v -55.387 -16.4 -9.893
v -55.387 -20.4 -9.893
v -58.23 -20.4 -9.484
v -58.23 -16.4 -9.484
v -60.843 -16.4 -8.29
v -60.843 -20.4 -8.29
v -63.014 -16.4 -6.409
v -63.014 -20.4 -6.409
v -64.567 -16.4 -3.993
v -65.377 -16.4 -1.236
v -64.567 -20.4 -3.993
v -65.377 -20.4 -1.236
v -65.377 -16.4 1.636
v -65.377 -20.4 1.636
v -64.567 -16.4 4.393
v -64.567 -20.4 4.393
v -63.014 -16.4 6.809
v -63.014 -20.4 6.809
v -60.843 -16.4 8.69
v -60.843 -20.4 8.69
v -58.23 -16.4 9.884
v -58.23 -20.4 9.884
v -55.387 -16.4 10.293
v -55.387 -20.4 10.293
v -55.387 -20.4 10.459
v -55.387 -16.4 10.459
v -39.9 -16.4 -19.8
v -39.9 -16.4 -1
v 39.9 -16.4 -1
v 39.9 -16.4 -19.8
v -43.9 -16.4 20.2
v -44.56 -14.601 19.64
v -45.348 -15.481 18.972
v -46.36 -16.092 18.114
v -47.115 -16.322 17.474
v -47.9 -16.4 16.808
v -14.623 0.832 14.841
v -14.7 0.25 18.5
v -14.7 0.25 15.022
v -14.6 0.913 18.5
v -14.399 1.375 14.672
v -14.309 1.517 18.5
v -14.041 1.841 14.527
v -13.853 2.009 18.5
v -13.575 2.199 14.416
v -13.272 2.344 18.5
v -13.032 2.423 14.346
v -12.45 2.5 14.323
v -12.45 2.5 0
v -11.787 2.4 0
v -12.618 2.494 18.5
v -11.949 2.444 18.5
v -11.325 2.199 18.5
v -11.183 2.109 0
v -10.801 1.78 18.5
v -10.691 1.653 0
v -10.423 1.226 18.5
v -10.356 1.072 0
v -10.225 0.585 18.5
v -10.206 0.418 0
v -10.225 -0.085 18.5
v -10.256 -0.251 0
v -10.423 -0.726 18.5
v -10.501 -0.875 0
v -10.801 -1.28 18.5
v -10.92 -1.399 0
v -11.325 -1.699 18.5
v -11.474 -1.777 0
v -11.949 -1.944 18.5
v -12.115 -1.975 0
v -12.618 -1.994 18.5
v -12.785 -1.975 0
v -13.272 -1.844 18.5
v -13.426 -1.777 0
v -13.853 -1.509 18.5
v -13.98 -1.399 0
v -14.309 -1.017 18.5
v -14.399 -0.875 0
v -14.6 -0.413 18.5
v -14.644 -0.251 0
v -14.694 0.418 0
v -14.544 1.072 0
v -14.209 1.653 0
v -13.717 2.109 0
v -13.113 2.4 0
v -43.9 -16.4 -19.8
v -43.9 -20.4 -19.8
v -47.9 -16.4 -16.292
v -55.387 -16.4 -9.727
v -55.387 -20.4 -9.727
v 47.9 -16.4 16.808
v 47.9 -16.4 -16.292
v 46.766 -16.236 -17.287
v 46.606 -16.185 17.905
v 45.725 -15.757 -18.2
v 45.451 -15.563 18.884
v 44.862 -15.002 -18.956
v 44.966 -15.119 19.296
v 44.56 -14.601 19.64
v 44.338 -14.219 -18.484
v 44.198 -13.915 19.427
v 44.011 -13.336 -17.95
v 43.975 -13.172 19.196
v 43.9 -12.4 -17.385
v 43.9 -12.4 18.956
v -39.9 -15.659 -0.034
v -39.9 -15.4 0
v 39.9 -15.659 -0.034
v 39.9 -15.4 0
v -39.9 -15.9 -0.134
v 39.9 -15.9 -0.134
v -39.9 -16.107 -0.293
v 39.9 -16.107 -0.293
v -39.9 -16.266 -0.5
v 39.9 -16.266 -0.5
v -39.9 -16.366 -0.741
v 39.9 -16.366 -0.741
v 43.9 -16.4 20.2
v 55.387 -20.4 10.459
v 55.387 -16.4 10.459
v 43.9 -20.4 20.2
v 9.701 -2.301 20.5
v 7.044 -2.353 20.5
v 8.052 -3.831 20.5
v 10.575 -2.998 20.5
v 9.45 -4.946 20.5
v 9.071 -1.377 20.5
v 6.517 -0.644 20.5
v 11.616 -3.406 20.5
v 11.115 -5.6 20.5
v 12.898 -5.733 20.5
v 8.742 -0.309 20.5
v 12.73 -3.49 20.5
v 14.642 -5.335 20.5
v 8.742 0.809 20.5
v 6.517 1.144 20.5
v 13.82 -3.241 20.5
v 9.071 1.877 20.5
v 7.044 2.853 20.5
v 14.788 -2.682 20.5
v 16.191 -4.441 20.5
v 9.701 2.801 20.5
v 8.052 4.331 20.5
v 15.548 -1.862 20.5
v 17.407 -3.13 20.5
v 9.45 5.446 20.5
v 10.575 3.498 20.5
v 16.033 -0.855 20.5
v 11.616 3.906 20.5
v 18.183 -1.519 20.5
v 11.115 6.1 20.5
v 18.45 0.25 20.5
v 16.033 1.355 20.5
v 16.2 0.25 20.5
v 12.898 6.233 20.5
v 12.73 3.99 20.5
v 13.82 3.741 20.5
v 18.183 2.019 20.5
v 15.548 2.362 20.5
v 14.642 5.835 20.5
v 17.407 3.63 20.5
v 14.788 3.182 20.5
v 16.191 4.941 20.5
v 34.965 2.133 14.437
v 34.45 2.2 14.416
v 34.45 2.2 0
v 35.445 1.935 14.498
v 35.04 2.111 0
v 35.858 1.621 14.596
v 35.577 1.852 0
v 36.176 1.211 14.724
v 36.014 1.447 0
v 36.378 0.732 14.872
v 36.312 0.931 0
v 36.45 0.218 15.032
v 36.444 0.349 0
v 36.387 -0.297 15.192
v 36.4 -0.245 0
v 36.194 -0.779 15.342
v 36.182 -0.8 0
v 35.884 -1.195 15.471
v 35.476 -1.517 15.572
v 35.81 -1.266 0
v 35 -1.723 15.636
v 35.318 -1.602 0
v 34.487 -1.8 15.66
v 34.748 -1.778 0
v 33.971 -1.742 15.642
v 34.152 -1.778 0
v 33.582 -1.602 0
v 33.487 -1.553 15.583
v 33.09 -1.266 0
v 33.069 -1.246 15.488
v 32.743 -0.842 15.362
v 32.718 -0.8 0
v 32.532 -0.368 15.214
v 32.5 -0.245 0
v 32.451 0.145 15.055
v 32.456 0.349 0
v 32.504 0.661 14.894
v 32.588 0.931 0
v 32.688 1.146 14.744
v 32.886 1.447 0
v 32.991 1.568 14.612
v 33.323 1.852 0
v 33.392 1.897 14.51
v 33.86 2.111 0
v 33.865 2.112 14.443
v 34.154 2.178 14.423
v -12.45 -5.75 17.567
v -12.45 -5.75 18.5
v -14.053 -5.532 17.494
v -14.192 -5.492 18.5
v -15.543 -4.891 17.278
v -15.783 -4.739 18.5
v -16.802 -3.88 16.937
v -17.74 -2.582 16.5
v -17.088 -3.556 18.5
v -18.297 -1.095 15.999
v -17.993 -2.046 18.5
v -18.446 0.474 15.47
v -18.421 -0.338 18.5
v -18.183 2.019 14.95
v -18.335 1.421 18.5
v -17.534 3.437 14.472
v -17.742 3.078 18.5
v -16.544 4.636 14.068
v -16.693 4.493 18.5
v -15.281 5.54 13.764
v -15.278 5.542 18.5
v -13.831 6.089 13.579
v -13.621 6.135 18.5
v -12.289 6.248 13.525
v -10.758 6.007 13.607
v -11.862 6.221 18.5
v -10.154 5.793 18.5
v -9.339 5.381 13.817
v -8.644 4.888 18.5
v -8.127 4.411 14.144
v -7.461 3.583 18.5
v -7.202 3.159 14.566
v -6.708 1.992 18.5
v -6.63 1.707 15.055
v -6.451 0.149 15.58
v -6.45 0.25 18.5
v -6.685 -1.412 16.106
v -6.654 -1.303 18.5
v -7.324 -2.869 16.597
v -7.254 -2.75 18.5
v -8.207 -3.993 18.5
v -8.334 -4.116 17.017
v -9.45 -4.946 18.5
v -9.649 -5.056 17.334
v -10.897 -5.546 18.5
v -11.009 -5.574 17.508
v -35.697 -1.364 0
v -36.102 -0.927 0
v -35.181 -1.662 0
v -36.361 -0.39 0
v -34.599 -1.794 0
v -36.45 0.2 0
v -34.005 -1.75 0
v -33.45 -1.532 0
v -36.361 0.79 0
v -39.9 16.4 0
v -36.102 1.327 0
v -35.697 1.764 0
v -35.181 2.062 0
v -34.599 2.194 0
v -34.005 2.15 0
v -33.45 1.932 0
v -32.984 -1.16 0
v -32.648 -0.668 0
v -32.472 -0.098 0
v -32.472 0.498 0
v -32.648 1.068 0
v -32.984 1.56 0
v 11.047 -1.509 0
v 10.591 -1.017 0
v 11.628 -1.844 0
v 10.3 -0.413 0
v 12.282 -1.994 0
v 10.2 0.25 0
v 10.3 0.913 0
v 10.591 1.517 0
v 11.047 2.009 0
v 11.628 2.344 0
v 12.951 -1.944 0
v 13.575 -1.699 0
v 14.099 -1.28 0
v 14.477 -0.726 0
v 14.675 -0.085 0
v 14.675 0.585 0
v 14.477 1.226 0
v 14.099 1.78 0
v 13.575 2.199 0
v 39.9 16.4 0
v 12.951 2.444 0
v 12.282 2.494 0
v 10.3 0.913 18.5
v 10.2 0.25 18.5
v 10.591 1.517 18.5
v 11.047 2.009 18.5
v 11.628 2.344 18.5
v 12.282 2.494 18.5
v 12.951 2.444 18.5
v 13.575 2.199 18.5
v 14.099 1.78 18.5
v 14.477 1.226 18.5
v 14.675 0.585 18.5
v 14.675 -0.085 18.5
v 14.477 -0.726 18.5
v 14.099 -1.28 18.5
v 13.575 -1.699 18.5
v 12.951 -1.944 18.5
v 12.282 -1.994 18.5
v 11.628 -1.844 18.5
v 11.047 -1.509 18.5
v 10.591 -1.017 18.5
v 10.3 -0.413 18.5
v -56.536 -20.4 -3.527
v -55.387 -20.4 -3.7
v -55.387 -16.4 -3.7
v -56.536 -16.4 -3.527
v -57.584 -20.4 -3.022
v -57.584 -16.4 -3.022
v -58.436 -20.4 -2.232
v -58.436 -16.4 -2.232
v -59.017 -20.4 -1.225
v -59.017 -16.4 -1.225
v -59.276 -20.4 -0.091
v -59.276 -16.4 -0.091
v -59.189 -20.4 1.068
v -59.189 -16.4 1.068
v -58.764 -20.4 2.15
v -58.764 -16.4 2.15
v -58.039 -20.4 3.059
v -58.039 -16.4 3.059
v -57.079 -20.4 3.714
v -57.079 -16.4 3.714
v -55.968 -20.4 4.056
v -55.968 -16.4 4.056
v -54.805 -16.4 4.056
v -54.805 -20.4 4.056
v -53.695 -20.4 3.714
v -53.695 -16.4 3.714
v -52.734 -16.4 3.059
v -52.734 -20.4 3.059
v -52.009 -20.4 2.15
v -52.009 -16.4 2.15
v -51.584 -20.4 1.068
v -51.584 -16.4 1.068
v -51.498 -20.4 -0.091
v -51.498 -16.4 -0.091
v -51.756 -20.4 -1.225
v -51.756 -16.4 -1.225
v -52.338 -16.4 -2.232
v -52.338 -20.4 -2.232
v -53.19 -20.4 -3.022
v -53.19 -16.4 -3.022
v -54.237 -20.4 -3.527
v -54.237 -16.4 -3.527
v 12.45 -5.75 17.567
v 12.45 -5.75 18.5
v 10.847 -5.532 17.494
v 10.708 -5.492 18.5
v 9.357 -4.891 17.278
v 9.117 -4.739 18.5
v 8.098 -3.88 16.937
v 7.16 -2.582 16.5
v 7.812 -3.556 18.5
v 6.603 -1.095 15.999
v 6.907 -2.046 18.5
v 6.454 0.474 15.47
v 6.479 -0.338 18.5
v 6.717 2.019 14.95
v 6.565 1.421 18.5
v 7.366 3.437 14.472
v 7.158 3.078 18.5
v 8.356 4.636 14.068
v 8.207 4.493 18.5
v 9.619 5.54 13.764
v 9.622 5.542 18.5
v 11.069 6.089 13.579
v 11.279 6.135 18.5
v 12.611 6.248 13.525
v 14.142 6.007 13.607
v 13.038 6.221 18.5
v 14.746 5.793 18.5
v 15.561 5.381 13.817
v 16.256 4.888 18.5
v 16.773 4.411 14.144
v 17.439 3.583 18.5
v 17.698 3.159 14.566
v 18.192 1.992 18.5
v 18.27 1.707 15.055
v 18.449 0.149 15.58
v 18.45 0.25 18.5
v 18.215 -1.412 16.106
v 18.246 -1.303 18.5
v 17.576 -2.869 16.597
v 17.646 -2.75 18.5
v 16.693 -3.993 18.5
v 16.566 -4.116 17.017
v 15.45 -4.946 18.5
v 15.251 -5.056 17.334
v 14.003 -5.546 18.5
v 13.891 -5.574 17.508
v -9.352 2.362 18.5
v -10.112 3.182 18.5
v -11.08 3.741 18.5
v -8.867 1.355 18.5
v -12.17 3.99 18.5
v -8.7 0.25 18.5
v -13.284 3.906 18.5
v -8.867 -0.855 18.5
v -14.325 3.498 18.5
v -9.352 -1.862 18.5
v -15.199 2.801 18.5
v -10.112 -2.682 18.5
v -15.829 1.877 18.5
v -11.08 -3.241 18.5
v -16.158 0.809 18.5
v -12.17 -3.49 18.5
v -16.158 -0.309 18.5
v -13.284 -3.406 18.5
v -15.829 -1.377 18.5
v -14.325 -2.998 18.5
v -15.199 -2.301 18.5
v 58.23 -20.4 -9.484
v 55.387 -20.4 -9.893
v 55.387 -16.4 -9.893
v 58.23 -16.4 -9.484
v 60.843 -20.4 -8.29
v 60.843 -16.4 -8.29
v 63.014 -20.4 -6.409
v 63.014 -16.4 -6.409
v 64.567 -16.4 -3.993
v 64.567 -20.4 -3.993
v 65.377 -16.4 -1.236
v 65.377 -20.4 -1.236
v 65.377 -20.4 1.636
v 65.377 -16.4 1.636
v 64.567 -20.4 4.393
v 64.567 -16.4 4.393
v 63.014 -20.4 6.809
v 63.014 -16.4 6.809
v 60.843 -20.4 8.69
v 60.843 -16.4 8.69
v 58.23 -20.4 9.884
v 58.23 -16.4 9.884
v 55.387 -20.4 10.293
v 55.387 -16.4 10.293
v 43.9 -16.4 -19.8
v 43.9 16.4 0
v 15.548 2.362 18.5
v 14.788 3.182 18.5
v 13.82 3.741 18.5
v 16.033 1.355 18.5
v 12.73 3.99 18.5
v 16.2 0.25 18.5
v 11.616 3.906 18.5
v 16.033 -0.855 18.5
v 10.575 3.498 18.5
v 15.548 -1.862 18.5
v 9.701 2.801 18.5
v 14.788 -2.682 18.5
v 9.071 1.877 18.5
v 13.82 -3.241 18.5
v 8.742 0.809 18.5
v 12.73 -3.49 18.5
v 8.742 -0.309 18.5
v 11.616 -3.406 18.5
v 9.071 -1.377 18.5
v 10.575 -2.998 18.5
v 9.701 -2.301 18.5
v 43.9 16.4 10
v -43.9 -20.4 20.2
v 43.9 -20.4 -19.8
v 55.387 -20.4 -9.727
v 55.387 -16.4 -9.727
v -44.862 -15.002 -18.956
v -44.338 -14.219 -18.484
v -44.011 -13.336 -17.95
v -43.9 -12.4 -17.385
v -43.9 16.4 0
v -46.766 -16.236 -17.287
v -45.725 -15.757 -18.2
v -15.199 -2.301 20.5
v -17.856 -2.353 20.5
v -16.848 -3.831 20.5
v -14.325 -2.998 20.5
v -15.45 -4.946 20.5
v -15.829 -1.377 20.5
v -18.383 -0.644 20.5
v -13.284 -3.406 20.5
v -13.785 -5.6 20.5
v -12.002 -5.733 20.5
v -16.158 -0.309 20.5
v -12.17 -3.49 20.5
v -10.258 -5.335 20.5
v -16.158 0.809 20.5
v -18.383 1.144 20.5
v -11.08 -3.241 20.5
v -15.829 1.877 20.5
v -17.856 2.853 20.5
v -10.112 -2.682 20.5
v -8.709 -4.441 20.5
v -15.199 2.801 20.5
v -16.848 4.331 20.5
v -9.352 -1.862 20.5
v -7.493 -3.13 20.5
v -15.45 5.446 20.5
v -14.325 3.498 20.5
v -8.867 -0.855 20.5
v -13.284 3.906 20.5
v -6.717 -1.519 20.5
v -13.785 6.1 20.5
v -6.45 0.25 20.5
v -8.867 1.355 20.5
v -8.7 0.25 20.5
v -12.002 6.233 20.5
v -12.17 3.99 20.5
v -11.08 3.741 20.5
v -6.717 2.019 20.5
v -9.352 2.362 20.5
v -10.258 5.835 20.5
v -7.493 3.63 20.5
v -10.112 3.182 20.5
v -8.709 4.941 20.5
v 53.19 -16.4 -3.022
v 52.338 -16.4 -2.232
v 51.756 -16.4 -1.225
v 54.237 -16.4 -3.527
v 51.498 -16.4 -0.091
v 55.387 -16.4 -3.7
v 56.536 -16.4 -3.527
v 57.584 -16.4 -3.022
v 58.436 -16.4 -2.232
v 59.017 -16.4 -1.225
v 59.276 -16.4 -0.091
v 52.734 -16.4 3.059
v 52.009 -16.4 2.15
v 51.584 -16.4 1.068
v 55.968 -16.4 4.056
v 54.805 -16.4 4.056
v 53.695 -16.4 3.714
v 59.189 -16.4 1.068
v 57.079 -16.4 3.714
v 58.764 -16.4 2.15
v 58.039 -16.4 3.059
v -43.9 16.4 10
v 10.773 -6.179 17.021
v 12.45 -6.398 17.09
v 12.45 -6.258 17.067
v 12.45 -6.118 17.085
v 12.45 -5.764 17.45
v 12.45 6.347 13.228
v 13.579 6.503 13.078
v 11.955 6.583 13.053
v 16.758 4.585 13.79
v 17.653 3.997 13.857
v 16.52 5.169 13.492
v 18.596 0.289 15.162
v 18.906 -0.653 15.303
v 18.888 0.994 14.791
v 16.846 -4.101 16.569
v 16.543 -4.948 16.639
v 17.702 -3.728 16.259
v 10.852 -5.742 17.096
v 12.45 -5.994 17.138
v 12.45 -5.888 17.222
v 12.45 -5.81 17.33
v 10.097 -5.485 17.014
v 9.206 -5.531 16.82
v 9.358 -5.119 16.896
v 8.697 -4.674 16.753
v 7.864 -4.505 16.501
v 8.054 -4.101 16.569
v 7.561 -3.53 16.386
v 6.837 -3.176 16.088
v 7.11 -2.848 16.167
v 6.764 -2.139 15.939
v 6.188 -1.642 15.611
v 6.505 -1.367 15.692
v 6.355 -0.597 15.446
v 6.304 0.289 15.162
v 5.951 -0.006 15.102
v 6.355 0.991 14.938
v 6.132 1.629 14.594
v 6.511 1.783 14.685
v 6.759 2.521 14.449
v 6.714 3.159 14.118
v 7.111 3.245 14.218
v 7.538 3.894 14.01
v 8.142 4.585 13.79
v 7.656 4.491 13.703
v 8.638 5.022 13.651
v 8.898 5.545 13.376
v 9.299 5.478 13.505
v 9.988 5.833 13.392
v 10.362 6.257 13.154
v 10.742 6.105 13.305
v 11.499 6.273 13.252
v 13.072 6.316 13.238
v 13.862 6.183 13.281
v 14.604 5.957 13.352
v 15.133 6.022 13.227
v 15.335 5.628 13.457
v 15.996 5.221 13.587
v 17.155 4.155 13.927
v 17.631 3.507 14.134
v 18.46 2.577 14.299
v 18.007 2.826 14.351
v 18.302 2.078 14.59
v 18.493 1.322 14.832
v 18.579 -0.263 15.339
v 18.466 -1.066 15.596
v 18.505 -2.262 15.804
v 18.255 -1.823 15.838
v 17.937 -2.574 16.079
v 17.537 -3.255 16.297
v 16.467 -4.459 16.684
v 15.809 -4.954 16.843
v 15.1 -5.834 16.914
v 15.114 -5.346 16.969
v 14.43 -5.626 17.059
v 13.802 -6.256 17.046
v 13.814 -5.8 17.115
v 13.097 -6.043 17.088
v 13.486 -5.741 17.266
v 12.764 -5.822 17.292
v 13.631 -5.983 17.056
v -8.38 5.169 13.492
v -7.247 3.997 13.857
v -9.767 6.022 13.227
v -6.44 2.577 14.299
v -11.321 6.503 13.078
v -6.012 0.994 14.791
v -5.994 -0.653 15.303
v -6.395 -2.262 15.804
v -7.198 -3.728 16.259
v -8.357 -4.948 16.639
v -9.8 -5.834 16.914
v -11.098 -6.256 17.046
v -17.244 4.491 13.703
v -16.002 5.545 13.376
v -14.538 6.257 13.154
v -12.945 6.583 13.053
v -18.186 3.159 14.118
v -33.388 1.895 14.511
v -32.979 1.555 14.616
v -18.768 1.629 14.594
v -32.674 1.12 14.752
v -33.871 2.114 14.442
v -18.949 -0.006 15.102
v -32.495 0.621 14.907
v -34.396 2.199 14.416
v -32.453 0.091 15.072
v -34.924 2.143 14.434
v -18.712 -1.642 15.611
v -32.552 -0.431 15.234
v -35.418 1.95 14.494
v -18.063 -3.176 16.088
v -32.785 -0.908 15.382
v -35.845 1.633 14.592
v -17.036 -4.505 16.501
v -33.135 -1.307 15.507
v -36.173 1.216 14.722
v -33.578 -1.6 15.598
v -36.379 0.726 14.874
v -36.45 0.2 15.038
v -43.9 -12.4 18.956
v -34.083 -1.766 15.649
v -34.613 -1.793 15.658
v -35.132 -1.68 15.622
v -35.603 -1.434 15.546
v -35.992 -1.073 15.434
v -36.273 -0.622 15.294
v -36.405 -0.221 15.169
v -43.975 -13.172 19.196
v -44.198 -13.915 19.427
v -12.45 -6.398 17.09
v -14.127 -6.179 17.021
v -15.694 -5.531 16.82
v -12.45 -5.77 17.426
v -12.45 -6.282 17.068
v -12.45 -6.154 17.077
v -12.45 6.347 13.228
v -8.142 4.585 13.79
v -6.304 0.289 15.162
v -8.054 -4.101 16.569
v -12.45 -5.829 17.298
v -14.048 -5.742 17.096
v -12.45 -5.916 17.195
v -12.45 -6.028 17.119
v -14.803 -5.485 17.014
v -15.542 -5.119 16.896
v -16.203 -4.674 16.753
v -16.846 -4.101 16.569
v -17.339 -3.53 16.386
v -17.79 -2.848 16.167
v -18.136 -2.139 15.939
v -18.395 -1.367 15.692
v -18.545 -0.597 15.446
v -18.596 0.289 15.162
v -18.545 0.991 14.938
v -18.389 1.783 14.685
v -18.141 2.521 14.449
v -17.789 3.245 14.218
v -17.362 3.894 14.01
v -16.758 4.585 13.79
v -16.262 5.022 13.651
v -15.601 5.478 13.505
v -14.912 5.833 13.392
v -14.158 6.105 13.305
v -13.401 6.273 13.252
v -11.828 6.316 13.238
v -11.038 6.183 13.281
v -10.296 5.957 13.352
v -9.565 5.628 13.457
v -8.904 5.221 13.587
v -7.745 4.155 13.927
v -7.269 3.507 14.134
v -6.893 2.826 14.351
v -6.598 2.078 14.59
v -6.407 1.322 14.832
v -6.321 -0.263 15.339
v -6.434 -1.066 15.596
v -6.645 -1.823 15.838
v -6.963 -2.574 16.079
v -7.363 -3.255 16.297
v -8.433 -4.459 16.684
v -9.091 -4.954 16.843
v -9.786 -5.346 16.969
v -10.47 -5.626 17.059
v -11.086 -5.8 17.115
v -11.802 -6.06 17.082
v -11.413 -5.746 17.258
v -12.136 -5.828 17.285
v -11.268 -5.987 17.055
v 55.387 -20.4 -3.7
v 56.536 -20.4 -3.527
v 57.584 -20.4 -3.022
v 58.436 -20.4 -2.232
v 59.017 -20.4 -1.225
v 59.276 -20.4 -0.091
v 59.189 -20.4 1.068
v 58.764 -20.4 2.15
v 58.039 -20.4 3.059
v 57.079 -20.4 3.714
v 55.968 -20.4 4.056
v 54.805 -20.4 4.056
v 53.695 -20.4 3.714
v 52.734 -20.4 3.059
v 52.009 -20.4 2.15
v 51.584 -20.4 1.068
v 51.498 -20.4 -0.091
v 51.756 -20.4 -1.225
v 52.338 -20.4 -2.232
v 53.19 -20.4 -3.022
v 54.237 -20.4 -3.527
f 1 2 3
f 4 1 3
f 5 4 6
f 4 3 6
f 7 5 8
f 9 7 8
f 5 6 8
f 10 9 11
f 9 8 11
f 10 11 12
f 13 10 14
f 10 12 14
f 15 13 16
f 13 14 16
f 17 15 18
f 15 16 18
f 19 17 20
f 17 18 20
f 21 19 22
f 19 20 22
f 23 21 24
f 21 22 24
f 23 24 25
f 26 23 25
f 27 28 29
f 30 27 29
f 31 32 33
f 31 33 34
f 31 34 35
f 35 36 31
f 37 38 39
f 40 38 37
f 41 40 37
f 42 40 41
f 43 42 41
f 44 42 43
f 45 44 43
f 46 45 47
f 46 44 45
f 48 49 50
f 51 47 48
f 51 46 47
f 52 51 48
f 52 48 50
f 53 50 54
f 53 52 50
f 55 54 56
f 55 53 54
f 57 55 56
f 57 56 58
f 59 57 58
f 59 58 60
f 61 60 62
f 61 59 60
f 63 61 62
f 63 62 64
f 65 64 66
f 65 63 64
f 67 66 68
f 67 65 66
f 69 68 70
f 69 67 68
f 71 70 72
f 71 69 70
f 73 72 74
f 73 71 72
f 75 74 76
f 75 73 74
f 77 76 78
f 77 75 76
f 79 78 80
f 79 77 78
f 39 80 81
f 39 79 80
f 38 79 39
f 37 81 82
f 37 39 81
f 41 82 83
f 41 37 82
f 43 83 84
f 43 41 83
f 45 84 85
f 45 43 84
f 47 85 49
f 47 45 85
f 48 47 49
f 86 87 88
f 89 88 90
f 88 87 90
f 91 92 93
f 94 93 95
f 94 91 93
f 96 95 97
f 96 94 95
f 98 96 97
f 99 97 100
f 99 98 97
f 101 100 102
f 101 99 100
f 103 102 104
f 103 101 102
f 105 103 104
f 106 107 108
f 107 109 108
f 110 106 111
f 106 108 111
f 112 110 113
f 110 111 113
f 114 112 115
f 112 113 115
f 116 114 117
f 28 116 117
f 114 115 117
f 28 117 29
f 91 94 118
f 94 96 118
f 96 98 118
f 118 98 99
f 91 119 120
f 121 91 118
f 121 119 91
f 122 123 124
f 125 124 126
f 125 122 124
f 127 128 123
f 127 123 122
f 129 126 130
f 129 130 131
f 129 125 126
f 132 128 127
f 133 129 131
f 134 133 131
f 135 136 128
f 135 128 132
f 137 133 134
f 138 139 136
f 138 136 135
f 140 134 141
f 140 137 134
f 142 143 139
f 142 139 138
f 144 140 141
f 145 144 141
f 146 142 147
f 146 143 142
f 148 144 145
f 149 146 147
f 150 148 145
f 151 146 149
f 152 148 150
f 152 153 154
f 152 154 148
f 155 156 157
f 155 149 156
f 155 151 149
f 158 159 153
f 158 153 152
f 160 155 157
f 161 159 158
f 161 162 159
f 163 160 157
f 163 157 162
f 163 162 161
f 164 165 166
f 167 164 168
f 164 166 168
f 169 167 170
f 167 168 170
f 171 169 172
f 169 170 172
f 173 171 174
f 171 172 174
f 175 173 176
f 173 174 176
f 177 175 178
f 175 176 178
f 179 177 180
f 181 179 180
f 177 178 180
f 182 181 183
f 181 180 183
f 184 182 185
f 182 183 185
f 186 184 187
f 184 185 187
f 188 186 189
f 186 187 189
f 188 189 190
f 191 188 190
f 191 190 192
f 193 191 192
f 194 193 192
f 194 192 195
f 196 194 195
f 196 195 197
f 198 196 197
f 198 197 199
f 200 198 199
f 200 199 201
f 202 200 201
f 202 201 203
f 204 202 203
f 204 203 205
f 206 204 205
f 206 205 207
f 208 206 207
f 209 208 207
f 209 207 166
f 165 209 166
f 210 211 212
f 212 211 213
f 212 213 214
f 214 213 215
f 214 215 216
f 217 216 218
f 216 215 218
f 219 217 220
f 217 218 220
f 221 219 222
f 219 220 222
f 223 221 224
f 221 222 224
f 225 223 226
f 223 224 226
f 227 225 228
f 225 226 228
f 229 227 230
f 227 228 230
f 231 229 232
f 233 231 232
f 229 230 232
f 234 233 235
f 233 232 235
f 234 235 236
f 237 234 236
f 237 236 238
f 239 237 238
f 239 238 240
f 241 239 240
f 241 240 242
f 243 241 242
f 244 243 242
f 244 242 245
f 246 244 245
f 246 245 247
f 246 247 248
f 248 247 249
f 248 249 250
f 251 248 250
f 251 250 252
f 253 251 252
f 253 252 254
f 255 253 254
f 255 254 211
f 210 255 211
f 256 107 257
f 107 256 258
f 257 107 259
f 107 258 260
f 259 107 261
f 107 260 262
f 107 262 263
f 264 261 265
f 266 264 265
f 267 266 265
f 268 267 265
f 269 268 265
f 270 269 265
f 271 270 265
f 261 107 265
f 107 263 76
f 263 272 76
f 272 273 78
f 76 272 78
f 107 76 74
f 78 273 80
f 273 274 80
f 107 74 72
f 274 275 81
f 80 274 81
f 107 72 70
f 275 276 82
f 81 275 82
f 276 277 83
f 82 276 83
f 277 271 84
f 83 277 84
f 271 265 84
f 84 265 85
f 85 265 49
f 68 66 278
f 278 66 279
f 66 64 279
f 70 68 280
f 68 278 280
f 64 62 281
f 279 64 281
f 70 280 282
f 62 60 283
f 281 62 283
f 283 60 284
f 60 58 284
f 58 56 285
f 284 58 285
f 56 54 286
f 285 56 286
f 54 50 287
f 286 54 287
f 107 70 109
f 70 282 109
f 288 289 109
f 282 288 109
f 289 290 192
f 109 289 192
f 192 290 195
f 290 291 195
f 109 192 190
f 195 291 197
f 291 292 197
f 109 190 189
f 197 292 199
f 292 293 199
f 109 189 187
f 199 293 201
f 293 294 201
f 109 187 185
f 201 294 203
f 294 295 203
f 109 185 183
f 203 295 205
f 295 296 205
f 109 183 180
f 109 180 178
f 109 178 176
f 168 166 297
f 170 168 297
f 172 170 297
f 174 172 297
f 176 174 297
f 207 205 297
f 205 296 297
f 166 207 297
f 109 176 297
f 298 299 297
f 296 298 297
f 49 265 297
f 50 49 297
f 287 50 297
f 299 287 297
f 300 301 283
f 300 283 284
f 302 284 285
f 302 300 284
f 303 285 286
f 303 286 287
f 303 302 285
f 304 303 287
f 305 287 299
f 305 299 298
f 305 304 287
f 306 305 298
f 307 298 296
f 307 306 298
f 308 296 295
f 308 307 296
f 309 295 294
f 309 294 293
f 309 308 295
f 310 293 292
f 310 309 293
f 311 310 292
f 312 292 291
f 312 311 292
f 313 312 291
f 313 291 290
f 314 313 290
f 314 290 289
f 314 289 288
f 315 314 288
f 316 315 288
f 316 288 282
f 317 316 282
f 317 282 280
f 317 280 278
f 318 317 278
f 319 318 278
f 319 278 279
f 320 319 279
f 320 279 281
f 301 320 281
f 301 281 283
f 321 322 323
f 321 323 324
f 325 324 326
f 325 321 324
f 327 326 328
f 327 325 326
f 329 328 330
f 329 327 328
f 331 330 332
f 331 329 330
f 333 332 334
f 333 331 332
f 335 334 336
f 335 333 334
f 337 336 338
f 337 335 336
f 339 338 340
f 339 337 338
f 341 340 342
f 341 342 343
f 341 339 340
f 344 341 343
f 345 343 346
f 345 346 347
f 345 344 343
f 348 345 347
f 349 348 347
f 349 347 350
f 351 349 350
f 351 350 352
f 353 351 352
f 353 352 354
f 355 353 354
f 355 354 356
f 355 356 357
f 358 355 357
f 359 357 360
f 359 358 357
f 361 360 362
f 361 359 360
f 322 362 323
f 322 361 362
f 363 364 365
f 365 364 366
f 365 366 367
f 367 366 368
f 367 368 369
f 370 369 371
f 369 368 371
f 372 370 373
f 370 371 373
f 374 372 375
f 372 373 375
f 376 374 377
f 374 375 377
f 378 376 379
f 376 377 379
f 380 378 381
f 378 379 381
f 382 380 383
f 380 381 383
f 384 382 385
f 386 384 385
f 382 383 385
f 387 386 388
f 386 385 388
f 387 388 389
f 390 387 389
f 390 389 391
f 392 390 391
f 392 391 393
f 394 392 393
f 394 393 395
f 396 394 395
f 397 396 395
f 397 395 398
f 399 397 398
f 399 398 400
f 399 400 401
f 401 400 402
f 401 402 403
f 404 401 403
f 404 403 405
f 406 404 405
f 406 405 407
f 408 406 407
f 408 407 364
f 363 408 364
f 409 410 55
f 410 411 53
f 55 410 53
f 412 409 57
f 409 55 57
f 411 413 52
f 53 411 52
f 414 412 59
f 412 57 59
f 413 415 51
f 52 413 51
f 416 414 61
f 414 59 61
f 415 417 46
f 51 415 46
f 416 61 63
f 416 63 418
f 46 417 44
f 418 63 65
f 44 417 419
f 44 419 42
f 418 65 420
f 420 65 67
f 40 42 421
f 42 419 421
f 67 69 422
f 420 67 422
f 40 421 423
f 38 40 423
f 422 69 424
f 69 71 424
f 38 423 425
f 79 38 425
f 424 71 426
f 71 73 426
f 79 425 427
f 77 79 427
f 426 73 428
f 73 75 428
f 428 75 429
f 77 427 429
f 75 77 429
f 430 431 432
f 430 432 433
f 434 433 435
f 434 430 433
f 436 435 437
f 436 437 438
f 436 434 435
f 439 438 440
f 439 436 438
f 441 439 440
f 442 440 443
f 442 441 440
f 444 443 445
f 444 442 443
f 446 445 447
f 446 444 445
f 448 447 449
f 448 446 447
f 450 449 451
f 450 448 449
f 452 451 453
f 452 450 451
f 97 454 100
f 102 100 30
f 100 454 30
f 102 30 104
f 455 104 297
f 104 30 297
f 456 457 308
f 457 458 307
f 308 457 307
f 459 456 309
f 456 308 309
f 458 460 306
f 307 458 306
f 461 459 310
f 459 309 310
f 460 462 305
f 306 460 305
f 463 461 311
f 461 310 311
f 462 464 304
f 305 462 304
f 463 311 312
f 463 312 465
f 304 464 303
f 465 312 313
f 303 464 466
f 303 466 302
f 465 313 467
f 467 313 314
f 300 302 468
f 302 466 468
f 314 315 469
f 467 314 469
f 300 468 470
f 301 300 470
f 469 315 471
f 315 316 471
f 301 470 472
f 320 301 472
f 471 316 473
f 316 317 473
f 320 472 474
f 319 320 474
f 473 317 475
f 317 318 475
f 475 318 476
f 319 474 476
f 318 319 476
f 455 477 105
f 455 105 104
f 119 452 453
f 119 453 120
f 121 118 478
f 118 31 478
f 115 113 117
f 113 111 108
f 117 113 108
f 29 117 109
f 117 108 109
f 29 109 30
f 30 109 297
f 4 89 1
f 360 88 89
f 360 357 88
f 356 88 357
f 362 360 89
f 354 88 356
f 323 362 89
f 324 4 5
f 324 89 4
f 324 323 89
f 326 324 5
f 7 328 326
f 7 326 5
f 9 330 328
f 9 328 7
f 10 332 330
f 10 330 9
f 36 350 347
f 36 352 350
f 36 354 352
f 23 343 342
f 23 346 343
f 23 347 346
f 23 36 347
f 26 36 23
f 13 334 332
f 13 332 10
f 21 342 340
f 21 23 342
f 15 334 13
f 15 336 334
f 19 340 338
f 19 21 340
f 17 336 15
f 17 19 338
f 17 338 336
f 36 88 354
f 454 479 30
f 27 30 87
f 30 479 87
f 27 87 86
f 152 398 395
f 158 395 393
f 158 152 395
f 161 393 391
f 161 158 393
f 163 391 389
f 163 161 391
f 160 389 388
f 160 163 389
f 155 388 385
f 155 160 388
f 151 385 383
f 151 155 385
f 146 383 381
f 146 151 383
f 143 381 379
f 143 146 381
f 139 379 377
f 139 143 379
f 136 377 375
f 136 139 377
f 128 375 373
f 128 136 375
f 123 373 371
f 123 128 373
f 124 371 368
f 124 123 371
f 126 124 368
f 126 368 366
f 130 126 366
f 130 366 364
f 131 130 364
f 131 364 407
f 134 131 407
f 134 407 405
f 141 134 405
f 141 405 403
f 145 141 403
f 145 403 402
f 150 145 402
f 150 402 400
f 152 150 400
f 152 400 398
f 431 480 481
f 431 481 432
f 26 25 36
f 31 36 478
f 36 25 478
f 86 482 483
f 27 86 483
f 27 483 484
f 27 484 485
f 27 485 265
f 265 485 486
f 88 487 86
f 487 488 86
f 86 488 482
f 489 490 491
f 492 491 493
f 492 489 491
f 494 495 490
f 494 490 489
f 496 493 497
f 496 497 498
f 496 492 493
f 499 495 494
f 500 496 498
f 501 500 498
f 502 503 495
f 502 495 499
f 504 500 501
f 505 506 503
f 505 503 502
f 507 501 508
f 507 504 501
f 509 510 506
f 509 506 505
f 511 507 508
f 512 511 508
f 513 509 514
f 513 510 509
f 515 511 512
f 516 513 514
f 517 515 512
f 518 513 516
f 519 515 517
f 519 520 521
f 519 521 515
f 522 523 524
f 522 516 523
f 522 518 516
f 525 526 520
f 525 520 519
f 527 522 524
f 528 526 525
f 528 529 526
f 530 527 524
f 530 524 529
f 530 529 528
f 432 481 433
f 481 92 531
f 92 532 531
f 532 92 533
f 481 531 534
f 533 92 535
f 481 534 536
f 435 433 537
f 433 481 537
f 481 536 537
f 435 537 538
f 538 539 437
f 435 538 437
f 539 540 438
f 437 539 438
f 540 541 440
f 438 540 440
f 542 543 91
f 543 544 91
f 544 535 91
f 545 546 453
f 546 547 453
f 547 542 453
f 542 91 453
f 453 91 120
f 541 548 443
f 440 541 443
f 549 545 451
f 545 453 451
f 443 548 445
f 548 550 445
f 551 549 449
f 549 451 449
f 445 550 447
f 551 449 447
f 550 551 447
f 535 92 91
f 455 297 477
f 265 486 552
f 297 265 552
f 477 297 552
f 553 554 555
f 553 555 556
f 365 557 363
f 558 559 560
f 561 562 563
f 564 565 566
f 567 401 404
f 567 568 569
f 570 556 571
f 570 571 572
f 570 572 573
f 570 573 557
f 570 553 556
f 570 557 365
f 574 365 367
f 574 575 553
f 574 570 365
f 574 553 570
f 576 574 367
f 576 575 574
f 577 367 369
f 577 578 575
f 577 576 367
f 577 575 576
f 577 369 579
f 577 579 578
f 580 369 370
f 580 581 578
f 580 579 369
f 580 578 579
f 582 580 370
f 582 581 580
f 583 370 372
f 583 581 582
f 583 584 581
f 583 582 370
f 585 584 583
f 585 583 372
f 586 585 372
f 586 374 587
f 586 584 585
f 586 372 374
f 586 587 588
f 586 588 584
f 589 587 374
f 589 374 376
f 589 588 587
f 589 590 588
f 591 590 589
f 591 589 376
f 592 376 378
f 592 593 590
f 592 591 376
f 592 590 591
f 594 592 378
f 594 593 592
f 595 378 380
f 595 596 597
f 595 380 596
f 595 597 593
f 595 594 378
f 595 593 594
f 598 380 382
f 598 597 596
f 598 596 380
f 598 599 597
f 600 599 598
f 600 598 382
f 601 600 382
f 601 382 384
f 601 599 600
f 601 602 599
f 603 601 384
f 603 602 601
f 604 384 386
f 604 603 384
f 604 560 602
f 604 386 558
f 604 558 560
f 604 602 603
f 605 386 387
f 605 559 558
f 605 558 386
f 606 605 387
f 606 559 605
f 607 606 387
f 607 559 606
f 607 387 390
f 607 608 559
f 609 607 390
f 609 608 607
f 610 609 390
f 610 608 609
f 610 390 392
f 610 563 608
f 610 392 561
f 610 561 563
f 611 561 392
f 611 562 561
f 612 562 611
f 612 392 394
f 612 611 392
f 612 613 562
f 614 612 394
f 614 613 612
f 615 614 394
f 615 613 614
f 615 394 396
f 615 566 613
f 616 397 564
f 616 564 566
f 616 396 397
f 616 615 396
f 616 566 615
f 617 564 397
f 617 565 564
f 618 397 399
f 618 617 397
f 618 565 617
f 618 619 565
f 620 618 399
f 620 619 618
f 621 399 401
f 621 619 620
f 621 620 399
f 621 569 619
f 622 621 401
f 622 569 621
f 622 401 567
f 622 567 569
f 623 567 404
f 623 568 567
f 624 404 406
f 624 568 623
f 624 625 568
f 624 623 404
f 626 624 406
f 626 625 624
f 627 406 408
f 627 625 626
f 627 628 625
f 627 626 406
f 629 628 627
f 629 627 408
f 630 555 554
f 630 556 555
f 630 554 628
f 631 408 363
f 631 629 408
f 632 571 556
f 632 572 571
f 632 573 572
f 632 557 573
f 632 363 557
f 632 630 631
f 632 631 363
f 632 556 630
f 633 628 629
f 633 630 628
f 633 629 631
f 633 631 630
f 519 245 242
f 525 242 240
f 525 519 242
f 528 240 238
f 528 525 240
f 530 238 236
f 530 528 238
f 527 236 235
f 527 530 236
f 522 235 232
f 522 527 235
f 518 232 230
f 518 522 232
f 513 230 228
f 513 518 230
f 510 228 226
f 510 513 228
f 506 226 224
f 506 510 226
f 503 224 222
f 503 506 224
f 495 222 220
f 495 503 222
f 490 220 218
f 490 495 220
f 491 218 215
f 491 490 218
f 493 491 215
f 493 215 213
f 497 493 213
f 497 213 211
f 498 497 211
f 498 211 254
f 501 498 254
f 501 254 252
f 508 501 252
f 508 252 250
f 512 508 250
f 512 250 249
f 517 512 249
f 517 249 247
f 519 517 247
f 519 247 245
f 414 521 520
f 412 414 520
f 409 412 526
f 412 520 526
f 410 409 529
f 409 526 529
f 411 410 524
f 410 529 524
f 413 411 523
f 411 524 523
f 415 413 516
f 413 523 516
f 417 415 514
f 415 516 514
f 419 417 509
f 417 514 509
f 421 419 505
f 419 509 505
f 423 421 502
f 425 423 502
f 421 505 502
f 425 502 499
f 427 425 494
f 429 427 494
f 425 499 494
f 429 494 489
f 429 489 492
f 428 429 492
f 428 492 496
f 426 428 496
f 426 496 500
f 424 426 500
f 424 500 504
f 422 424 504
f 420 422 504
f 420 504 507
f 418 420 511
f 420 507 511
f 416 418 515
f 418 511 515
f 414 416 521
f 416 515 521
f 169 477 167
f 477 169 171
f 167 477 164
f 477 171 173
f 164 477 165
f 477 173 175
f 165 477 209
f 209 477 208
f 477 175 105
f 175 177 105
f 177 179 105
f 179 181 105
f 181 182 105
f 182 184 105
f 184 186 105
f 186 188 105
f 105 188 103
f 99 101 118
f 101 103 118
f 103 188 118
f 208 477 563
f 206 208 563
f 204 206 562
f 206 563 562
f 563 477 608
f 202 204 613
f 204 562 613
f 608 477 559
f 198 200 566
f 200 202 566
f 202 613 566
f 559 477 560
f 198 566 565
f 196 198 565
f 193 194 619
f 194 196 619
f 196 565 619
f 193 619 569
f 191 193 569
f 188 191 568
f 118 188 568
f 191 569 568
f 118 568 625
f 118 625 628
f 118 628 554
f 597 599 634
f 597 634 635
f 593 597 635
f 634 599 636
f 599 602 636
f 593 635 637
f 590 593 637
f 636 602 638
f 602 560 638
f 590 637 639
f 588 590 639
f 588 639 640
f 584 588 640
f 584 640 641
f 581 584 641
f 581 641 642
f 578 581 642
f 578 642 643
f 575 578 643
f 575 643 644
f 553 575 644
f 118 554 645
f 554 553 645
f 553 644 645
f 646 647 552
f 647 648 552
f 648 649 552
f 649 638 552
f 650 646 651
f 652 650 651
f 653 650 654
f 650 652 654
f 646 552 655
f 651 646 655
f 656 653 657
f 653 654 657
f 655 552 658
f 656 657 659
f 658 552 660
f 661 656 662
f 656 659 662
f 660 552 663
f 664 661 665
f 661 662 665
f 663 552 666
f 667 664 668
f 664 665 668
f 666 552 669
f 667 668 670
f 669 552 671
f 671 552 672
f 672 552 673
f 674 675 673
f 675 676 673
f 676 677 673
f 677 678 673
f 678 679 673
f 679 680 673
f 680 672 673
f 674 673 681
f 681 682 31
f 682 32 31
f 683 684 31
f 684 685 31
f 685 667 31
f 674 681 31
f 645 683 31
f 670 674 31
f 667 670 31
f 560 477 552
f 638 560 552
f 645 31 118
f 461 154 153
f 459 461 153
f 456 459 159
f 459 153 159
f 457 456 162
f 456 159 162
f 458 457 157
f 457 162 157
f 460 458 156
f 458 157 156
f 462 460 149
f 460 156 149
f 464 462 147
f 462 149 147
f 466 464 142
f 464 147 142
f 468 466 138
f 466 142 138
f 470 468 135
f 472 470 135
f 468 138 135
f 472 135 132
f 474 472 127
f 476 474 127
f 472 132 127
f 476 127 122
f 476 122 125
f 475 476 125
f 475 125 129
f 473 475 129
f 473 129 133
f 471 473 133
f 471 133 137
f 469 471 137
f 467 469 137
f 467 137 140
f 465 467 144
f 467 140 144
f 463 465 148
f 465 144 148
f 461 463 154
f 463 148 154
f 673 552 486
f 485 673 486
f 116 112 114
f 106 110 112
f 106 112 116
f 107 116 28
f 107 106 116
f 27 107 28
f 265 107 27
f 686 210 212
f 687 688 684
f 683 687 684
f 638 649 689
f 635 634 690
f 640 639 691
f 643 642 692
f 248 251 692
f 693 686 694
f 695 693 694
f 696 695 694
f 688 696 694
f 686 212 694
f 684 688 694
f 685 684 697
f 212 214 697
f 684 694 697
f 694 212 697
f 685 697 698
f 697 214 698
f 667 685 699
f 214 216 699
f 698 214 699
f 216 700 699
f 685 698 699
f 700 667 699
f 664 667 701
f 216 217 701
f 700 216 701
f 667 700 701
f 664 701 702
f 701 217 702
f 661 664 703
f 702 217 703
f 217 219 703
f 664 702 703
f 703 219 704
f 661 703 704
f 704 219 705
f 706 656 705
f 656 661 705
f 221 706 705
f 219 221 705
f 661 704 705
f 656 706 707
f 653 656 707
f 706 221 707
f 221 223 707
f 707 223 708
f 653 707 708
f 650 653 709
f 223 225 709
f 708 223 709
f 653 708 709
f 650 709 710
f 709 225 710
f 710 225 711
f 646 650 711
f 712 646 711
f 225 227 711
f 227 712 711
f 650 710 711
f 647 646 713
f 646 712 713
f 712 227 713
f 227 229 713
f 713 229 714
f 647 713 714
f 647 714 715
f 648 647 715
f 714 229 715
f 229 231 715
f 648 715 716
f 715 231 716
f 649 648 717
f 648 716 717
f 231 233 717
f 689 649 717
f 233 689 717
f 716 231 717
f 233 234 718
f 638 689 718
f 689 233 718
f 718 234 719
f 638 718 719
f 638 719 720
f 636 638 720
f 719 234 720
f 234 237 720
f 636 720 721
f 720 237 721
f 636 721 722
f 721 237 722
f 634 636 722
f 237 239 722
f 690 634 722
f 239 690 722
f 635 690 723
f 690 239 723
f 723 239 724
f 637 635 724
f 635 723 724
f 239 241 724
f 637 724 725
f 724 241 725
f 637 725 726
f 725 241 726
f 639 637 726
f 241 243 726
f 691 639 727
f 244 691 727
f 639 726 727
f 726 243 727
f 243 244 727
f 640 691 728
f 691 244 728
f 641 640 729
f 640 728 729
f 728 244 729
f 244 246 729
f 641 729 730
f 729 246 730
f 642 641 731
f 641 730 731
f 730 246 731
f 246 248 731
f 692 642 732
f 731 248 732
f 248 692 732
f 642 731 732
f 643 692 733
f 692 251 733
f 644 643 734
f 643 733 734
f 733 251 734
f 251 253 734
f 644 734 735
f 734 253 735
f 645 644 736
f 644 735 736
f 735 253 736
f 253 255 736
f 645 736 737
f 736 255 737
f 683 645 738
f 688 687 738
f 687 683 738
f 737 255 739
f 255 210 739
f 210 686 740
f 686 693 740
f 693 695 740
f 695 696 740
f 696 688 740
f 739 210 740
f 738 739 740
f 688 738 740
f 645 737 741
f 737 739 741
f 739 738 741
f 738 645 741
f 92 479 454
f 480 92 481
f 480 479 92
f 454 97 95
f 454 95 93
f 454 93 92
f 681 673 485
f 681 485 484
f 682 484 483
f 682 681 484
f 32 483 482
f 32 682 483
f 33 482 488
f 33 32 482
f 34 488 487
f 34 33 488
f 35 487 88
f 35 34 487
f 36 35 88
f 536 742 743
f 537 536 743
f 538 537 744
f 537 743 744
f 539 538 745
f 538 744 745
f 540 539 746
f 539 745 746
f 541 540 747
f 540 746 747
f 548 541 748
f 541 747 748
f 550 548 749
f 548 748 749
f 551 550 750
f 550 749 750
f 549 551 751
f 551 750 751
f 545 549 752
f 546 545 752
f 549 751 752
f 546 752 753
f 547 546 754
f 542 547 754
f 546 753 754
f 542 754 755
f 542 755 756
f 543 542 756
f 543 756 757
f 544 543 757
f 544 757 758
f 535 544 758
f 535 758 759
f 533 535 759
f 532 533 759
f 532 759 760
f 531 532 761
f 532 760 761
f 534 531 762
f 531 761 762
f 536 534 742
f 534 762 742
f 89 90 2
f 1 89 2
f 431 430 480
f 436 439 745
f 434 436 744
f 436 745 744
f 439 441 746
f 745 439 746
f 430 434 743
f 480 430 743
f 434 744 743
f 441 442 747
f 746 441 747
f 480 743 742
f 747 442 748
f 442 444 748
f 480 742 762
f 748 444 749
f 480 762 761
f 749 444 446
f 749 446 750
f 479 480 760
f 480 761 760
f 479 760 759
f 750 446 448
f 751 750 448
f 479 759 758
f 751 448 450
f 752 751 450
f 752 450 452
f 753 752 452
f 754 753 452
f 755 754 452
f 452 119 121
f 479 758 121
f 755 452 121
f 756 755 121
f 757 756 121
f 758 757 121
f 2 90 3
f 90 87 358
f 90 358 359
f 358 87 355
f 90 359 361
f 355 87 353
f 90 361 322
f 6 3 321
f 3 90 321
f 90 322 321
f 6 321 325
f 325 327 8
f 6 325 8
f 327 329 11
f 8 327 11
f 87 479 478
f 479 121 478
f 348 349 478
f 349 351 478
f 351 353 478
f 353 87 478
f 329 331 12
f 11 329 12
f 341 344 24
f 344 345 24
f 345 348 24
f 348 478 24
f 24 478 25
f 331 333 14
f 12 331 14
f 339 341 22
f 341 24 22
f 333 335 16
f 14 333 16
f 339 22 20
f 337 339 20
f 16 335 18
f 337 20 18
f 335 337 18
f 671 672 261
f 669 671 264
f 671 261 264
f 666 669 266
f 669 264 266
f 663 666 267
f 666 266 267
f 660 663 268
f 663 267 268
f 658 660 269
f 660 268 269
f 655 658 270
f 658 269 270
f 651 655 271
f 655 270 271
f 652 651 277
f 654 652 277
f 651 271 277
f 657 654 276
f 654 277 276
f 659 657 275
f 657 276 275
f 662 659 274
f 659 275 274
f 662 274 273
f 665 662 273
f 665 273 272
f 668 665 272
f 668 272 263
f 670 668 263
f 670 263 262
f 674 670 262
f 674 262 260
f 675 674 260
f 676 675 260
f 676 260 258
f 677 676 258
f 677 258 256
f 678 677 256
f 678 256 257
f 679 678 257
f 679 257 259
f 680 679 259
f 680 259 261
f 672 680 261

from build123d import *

# Parameters (mm, degrees)
SKETCH1_W            = 79.8
SKETCH1_H            = 32.8
BOSS_EXTRUDE1_DEPTH  = 10
SKETCH3_W            = 79.8
SKETCH3_H            = 19.8
SKETCH3_H_2          = 10.2
SKETCH3_H_3          = 10
BOSS_EXTRUDE3_DEPTH  = 4
BOSS_EXTRUDE4_DEPTH  = 4
SKETCH5_R            = 3.9
BOSS_EXTRUDE5_DEPTH  = 4
FILLET3_R            = 4
FILLET4_R            = 1
BOSS_EXTRUDE9_DEPTH  = 79.8
SKETCH6_R            = 2.25
SKETCH6_R_2          = 2
CUT_EXTRUDE1_DEPTH   = 38.2
BOSS_EXTRUDE10_REACH = 80.553
SKETCH12_R           = 6
SKETCH12_R_2         = 2.25
BOSS_EXTRUDE11_START = 2
SKETCH14_R           = 6
SKETCH14_R_2         = 3.75
BOSS_EXTRUDE11_DEPTH = 2
FILLET5_R            = 0.5


with BuildPart() as part:
    # Sketch1 → Boss-Extrude1 (new body)
    with BuildSketch(Plane.XY):
        Rectangle(SKETCH1_W, SKETCH1_H)
    extrude(amount=BOSS_EXTRUDE1_DEPTH)

    # Sketch3 → Boss-Extrude3 (add)
    with BuildSketch(Plane.XZ.offset(16.4)):
        with Locations((0, -9.9)):
            Rectangle(SKETCH3_W, SKETCH3_H)
        with Locations((0, 15.1)):
            Rectangle(SKETCH3_W, SKETCH3_H_2)
        with Locations((0, 5)):
            Rectangle(SKETCH3_W, SKETCH3_H_3)
    extrude(amount=BOSS_EXTRUDE3_DEPTH)

    # Sketch4 → Boss-Extrude4 (add)
    with BuildSketch(Plane.ZY.offset(39.9)):
        Polygon((10, 16.4), (20.2, -16.4), (20.2, -20.4), (-19.8, -20.4), (-19.8, -16.4), (0, 16.4), align=None)
    boss_extrude4 = extrude(amount=BOSS_EXTRUDE4_DEPTH)

    # Mirror1: Boss-Extrude4 across plane
    add(boss_extrude4.mirror(Plane(origin=(0, 0, 0), x_dir=(0, 0, 1), z_dir=(1, 0, 0))))

    # Sketch5 → Boss-Extrude5 (add)
    with BuildSketch(Plane.XZ.offset(20.4)):
        with BuildLine():
            Line((43.9, 20.2), (43.9, -19.8))
            Line((43.9, -19.8), (55.386672933, -9.72660048))
            Line((55.386672933, -9.72660048), (55.386672933, -9.892664239))
            ThreePointArc((55.386672933, -9.892664239), (65.479337172, 0.2), (55.386672933, 10.292664239))
            Line((55.386672933, 10.292664239), (55.386672933, 10.458727998))
            Line((55.386672933, 10.458727998), (43.9, 20.2))
        make_face()
        with Locations(Location((55.386672933, 0.2, 0), (0, 0, 270))):
            Circle(SKETCH5_R, mode=Mode.SUBTRACT)
    boss_extrude5 = extrude(amount=-BOSS_EXTRUDE5_DEPTH)

    # Mirror2: Boss-Extrude5 across plane
    add(boss_extrude5.mirror(Plane(origin=(0, 0, 0), x_dir=(0, 0, 1), z_dir=(1, 0, 0))))

    # Fillet3
    # the kernel refuses this fillet: 4 mm, written as the material it adds along each edge
    with BuildSketch(Plane(origin=(43.9, -16.4, 30.2), x_dir=(1, 0, 0), z_dir=(0, 0, -1))) as fillet3_piece_1_section:
        with BuildLine():
            CenterArc((FILLET3_R, -FILLET3_R), FILLET3_R, 90, 90)
            Line((0, -FILLET3_R), (0, 0))
            Line((0, 0), (FILLET3_R, 0))
        make_face()
    fillet3_piece_1 = extrude(amount=60, mode=Mode.PRIVATE)
    fillet3_piece_1 = split(fillet3_piece_1, bisect_by=Plane(origin=(54.225128719, -15.491118341, 11.44377547), z_dir=(-0.6467845633993831, 0, -0.7626727532489078)), keep=Keep.TOP, mode=Mode.PRIVATE)
    fillet3_piece_1 = split(fillet3_piece_1, bisect_by=Plane(origin=(54.366477736, -15.491118341, -10.621275019), z_dir=(-0.659340550917199, 0, 0.7518444240108485)), keep=Keep.TOP, mode=Mode.PRIVATE)
    fillet3_piece_1 = split(fillet3_piece_1, bisect_by=Plane(origin=(44.781661859, -6.837280787, -14.027382914), z_dir=(0, -0.5167969163836084, 0.8561080231001189)), keep=Keep.TOP, mode=Mode.PRIVATE)
    fillet3_piece_1 = split(fillet3_piece_1, bisect_by=Plane(origin=(44.781661859, -9.930876549, 18.18826039), z_dir=(0, -0.29694857943139136, -0.9548934711127094)), keep=Keep.TOP, mode=Mode.PRIVATE)
    add(fillet3_piece_1)
    with BuildSketch(Plane(origin=(-43.9, -16.4, 30.2), x_dir=(-1, 0, 0), z_dir=(0, 0, -1))) as fillet3_piece_2_section:
        with BuildLine():
            CenterArc((FILLET3_R, FILLET3_R), FILLET3_R, 180, 90)
            Line((0, FILLET3_R), (0, 0))
            Line((0, 0), (FILLET3_R, 0))
        make_face()
    fillet3_piece_2 = extrude(amount=60, mode=Mode.PRIVATE)
    fillet3_piece_2 = split(fillet3_piece_2, bisect_by=Plane(origin=(-54.366477736, -15.491118341, -10.621275019), z_dir=(0.659340550917199, 0, 0.7518444240108485)), keep=Keep.TOP, mode=Mode.PRIVATE)
    fillet3_piece_2 = split(fillet3_piece_2, bisect_by=Plane(origin=(-44.781661859, -6.837280787, -14.027382914), z_dir=(0, -0.5167969163836084, 0.8561080231001189)), keep=Keep.TOP, mode=Mode.PRIVATE)
    fillet3_piece_2 = split(fillet3_piece_2, bisect_by=Plane(origin=(-54.225128719, -15.491118341, 11.44377547), z_dir=(0.6467845633993831, 0, -0.7626727532489078)), keep=Keep.TOP, mode=Mode.PRIVATE)
    fillet3_piece_2 = split(fillet3_piece_2, bisect_by=Plane(origin=(-44.781661859, -9.930876549, 18.18826039), z_dir=(0, -0.29694857943139136, -0.9548934711127094)), keep=Keep.TOP, mode=Mode.PRIVATE)
    add(fillet3_piece_2)

    # Fillet4
    fillet4_edges = [part.edges().sort_by_distance(p)[0] for p in [
        (0, -16.4, 0),
    ]]
    fillet(fillet4_edges, radius=FILLET4_R)

    # Sketch11 → Boss-Extrude9 (add)
    with BuildSketch(Plane(origin=(-39.9, 0, 0), x_dir=(0, 0, -1), z_dir=(1, 0, 0))):
        Polygon((-20.2, -16.4), (-10, -16.4), (-10, 16.4), align=None)
    extrude(amount=BOSS_EXTRUDE9_DEPTH)

    # Sketch6 → Cut-Extrude1 (cut)
    with BuildSketch(Plane(origin=(0, 0, 0), x_dir=(-1, 0, 0), z_dir=(0, 0, -1))):
        with Locations((-12.45, 0.25)):
            Circle(SKETCH6_R)
        with Locations(Location((12.45, 0.25, 0), (0, 0, 90))):
            Circle(SKETCH6_R)
        with Locations((34.45, 0.2)):
            Circle(SKETCH6_R_2)
        with Locations(Location((-34.45, 0.2, 0), (0, 0, 90))):
            Circle(SKETCH6_R_2)
    extrude(amount=-CUT_EXTRUDE1_DEPTH, mode=Mode.SUBTRACT)

    # Boss-Extrude10: up to this plane
    boss_extrude10_end = Plane(origin=(-43.9, 16.4, 10), z_dir=(0, -0.29694857943139136, -0.9548934711127095))
    # Sketch12 → Boss-Extrude10 (add, up to the surface)
    with BuildSketch(Plane(origin=(0, 0, 18.5), x_dir=(-1, 0, 0), z_dir=(0, 0, -1)), mode=Mode.PRIVATE) as boss_extrude10_sk1:
        with Locations(Location((12.45, 0.25, 0), (0, 0, 270))):
            Circle(SKETCH12_R)
        with Locations((12.45, 0.25)):
            Circle(SKETCH12_R_2, mode=Mode.SUBTRACT)
    boss_extrude10_tool1 = split(extrude(boss_extrude10_sk1.sketch, amount=BOSS_EXTRUDE10_REACH, mode=Mode.PRIVATE), bisect_by=boss_extrude10_end, keep=Keep.BOTH, mode=Mode.PRIVATE)
    add(boss_extrude10_tool1.solids().sort_by_distance((-12.45, 6.080294, 18.5))[0])
    # Sketch12 → Boss-Extrude10 (add, up to the surface)
    with BuildSketch(Plane(origin=(0, 0, 18.5), x_dir=(-1, 0, 0), z_dir=(0, 0, -1)), mode=Mode.PRIVATE) as boss_extrude10_sk2:
        with Locations(Location((-12.45, 0.25, 0), (0, 0, 270))):
            Circle(SKETCH12_R)
        with Locations((-12.45, 0.25)):
            Circle(SKETCH12_R_2, mode=Mode.SUBTRACT)
    boss_extrude10_tool2 = split(extrude(boss_extrude10_sk2.sketch, amount=BOSS_EXTRUDE10_REACH, mode=Mode.PRIVATE), bisect_by=boss_extrude10_end, keep=Keep.BOTH, mode=Mode.PRIVATE)
    add(boss_extrude10_tool2.solids().sort_by_distance((12.45, 6.080294, 18.5))[0])

    # Sketch14 → Boss-Extrude11 (add)
    # profile 1 of 2: a face of its own
    with BuildSketch(Plane.XY.offset(18.5).offset(BOSS_EXTRUDE11_START)):
        with Locations((-12.45, 0.25)):
            Circle(SKETCH14_R)
        with Locations((-12.45, 0.25)):
            Circle(SKETCH14_R_2, mode=Mode.SUBTRACT)
    # profile 2 of 2: a face of its own
    with BuildSketch(Plane.XY.offset(18.5).offset(BOSS_EXTRUDE11_START)):
        with Locations((12.45, 0.25)):
            Circle(SKETCH14_R)
        with Locations((12.45, 0.25)):
            Circle(SKETCH14_R_2, mode=Mode.SUBTRACT)
    extrude(amount=-BOSS_EXTRUDE11_DEPTH)

    # Fillet5
    fillet5_edges = [part.edges().sort_by_distance(p)[0] for p in [
        (-12.449991171, 6.25, 13.156402439),
        (12.450008829, 6.25, 13.156402439),
    ]]
    fillet(fillet5_edges, radius=FILLET5_R)


solid = part.part
